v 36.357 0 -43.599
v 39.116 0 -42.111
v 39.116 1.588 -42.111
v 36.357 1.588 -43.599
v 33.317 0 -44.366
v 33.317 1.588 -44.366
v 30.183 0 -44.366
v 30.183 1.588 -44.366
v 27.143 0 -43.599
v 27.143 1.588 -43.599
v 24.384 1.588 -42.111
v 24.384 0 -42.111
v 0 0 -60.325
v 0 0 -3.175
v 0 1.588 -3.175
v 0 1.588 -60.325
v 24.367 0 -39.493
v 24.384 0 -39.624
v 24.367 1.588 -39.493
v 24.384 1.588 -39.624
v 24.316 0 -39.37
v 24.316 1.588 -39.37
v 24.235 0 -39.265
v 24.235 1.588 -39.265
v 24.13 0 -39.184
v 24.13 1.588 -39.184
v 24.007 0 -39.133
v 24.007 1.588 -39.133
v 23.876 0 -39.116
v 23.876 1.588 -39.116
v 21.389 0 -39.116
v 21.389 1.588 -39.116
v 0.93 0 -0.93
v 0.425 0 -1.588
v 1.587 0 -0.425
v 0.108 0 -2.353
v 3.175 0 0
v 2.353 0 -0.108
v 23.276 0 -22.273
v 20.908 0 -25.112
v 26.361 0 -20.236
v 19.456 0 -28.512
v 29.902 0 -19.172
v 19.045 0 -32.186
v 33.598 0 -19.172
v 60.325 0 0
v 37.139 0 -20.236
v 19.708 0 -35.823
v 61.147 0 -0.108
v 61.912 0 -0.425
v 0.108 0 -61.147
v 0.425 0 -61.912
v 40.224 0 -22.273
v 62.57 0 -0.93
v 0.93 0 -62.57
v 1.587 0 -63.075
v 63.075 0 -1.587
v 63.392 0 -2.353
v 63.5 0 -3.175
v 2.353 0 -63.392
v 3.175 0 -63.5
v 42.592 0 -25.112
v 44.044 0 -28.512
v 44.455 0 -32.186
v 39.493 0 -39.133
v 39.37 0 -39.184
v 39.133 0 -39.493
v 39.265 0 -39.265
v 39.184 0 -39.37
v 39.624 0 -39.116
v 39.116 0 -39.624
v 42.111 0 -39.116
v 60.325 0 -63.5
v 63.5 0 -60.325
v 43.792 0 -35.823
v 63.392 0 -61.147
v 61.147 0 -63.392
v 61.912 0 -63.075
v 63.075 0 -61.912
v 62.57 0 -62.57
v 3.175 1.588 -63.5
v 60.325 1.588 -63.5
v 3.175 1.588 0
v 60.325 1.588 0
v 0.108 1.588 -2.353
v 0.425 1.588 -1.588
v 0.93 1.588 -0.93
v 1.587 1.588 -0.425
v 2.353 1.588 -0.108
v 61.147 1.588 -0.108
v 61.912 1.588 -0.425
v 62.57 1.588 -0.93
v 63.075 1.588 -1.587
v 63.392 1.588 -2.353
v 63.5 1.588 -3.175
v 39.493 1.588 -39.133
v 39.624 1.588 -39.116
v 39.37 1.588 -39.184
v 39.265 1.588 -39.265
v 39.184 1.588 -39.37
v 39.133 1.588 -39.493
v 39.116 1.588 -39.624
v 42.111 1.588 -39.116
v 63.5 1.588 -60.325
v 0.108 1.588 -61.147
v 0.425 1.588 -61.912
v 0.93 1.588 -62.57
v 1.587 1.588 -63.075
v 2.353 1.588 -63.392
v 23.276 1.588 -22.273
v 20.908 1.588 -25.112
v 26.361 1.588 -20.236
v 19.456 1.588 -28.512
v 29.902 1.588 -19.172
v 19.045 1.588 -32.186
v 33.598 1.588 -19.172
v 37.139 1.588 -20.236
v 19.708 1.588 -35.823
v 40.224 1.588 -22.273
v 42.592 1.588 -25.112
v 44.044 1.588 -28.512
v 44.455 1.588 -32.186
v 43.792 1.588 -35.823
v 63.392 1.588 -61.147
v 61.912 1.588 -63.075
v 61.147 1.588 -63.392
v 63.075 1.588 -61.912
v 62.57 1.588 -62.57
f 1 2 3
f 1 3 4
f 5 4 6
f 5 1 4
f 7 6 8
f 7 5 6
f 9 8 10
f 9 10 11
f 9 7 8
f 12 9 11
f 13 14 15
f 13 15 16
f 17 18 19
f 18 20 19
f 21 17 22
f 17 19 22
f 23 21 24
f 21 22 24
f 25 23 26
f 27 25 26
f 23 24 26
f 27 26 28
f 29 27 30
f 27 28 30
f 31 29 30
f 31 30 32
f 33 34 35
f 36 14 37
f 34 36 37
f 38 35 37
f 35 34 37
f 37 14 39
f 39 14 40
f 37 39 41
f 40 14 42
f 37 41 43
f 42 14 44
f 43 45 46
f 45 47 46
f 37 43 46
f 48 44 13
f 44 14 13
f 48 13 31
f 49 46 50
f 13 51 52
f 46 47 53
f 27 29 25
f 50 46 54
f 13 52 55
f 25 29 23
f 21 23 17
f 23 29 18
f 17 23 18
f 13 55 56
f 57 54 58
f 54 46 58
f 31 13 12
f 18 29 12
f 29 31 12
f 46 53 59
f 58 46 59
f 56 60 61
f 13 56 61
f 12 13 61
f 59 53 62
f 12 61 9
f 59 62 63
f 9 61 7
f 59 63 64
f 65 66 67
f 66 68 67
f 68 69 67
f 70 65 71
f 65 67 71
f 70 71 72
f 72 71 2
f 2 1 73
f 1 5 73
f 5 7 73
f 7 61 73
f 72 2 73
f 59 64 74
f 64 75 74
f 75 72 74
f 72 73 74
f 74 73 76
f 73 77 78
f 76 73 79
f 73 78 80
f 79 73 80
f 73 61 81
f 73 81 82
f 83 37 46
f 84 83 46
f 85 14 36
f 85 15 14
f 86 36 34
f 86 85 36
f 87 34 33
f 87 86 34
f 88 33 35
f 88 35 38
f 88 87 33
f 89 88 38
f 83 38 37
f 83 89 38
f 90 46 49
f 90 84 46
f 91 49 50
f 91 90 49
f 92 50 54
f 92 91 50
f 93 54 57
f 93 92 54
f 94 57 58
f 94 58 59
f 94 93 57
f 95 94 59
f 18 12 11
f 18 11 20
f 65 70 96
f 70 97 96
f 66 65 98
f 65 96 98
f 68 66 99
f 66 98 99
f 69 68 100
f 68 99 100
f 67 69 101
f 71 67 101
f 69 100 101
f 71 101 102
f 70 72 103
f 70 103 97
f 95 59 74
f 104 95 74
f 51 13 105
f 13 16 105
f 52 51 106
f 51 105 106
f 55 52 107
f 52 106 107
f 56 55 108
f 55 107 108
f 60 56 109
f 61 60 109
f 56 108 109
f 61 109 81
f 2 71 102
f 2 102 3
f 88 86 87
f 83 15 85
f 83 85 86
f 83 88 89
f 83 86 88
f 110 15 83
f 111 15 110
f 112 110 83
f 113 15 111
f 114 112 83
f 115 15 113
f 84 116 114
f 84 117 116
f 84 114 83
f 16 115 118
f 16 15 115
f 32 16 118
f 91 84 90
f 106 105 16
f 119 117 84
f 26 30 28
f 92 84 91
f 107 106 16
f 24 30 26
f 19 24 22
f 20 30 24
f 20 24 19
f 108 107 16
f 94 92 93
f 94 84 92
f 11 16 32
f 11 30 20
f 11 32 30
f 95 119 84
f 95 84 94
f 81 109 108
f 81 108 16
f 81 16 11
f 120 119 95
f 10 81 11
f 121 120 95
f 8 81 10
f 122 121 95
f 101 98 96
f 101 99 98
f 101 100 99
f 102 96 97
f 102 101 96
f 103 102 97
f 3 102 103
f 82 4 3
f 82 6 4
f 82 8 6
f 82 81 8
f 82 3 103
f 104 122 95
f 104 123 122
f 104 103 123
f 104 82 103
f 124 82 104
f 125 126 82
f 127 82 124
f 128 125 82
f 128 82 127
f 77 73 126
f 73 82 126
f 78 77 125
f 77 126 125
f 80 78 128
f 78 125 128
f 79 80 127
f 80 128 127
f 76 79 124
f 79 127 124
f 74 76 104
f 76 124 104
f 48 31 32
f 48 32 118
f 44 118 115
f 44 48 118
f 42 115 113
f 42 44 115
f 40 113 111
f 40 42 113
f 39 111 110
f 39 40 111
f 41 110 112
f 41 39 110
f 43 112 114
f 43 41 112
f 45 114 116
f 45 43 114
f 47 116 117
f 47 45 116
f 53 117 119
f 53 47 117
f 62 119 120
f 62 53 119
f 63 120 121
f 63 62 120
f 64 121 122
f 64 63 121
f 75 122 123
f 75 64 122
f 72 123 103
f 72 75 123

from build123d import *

# Parameters (mm, degrees)
SKETCH1_W           = 63.5
SKETCH1_H           = 63.5
BOSS_EXTRUDE1_DEPTH = 1.5875
FILLET1_R           = 0.508
FILLET2_R           = 3.175


with BuildPart() as part:
    # Sketch1 → Boss-Extrude1 (new body)
    with BuildSketch(Plane(origin=(0, 0, 0), x_dir=(1, 0, 0), z_dir=(0, 1, 0))):
        with Locations((31.75, 31.75)):
            Rectangle(SKETCH1_W, SKETCH1_H)
        with BuildLine():
            Line((24.384, 42.111215435), (24.384, 39.116))
            Line((24.384, 39.116), (21.388784565, 39.116))
            ThreePointArc((21.388784565, 39.116), (31.75, 19.0373), (42.111215435, 39.116))
            Line((42.111215435, 39.116), (39.116, 39.116))
            Line((39.116, 39.116), (39.116, 42.111215435))
            ThreePointArc((39.116, 42.111215435), (31.75, 44.4627), (24.384, 42.111215435))
        make_face(mode=Mode.SUBTRACT)
    extrude(amount=BOSS_EXTRUDE1_DEPTH)

    # Fillet1
    fillet1_edges = [part.edges().sort_by_distance(p)[0] for p in [
        (24.384, 0.79375, -39.116),
        (39.116, 0.79375, -39.116),
    ]]
    fillet(fillet1_edges, radius=FILLET1_R)

    # Fillet2
    fillet2_edges = [part.edges().sort_by_distance(p)[0] for p in [
        (0, 0.79375, -63.5),
        (63.5, 0.79375, -63.5),
        (63.5, 0.79375, 0),
        (0, 0.79375, 0),
    ]]
    fillet(fillet2_edges, radius=FILLET2_R)


solid = part.part
